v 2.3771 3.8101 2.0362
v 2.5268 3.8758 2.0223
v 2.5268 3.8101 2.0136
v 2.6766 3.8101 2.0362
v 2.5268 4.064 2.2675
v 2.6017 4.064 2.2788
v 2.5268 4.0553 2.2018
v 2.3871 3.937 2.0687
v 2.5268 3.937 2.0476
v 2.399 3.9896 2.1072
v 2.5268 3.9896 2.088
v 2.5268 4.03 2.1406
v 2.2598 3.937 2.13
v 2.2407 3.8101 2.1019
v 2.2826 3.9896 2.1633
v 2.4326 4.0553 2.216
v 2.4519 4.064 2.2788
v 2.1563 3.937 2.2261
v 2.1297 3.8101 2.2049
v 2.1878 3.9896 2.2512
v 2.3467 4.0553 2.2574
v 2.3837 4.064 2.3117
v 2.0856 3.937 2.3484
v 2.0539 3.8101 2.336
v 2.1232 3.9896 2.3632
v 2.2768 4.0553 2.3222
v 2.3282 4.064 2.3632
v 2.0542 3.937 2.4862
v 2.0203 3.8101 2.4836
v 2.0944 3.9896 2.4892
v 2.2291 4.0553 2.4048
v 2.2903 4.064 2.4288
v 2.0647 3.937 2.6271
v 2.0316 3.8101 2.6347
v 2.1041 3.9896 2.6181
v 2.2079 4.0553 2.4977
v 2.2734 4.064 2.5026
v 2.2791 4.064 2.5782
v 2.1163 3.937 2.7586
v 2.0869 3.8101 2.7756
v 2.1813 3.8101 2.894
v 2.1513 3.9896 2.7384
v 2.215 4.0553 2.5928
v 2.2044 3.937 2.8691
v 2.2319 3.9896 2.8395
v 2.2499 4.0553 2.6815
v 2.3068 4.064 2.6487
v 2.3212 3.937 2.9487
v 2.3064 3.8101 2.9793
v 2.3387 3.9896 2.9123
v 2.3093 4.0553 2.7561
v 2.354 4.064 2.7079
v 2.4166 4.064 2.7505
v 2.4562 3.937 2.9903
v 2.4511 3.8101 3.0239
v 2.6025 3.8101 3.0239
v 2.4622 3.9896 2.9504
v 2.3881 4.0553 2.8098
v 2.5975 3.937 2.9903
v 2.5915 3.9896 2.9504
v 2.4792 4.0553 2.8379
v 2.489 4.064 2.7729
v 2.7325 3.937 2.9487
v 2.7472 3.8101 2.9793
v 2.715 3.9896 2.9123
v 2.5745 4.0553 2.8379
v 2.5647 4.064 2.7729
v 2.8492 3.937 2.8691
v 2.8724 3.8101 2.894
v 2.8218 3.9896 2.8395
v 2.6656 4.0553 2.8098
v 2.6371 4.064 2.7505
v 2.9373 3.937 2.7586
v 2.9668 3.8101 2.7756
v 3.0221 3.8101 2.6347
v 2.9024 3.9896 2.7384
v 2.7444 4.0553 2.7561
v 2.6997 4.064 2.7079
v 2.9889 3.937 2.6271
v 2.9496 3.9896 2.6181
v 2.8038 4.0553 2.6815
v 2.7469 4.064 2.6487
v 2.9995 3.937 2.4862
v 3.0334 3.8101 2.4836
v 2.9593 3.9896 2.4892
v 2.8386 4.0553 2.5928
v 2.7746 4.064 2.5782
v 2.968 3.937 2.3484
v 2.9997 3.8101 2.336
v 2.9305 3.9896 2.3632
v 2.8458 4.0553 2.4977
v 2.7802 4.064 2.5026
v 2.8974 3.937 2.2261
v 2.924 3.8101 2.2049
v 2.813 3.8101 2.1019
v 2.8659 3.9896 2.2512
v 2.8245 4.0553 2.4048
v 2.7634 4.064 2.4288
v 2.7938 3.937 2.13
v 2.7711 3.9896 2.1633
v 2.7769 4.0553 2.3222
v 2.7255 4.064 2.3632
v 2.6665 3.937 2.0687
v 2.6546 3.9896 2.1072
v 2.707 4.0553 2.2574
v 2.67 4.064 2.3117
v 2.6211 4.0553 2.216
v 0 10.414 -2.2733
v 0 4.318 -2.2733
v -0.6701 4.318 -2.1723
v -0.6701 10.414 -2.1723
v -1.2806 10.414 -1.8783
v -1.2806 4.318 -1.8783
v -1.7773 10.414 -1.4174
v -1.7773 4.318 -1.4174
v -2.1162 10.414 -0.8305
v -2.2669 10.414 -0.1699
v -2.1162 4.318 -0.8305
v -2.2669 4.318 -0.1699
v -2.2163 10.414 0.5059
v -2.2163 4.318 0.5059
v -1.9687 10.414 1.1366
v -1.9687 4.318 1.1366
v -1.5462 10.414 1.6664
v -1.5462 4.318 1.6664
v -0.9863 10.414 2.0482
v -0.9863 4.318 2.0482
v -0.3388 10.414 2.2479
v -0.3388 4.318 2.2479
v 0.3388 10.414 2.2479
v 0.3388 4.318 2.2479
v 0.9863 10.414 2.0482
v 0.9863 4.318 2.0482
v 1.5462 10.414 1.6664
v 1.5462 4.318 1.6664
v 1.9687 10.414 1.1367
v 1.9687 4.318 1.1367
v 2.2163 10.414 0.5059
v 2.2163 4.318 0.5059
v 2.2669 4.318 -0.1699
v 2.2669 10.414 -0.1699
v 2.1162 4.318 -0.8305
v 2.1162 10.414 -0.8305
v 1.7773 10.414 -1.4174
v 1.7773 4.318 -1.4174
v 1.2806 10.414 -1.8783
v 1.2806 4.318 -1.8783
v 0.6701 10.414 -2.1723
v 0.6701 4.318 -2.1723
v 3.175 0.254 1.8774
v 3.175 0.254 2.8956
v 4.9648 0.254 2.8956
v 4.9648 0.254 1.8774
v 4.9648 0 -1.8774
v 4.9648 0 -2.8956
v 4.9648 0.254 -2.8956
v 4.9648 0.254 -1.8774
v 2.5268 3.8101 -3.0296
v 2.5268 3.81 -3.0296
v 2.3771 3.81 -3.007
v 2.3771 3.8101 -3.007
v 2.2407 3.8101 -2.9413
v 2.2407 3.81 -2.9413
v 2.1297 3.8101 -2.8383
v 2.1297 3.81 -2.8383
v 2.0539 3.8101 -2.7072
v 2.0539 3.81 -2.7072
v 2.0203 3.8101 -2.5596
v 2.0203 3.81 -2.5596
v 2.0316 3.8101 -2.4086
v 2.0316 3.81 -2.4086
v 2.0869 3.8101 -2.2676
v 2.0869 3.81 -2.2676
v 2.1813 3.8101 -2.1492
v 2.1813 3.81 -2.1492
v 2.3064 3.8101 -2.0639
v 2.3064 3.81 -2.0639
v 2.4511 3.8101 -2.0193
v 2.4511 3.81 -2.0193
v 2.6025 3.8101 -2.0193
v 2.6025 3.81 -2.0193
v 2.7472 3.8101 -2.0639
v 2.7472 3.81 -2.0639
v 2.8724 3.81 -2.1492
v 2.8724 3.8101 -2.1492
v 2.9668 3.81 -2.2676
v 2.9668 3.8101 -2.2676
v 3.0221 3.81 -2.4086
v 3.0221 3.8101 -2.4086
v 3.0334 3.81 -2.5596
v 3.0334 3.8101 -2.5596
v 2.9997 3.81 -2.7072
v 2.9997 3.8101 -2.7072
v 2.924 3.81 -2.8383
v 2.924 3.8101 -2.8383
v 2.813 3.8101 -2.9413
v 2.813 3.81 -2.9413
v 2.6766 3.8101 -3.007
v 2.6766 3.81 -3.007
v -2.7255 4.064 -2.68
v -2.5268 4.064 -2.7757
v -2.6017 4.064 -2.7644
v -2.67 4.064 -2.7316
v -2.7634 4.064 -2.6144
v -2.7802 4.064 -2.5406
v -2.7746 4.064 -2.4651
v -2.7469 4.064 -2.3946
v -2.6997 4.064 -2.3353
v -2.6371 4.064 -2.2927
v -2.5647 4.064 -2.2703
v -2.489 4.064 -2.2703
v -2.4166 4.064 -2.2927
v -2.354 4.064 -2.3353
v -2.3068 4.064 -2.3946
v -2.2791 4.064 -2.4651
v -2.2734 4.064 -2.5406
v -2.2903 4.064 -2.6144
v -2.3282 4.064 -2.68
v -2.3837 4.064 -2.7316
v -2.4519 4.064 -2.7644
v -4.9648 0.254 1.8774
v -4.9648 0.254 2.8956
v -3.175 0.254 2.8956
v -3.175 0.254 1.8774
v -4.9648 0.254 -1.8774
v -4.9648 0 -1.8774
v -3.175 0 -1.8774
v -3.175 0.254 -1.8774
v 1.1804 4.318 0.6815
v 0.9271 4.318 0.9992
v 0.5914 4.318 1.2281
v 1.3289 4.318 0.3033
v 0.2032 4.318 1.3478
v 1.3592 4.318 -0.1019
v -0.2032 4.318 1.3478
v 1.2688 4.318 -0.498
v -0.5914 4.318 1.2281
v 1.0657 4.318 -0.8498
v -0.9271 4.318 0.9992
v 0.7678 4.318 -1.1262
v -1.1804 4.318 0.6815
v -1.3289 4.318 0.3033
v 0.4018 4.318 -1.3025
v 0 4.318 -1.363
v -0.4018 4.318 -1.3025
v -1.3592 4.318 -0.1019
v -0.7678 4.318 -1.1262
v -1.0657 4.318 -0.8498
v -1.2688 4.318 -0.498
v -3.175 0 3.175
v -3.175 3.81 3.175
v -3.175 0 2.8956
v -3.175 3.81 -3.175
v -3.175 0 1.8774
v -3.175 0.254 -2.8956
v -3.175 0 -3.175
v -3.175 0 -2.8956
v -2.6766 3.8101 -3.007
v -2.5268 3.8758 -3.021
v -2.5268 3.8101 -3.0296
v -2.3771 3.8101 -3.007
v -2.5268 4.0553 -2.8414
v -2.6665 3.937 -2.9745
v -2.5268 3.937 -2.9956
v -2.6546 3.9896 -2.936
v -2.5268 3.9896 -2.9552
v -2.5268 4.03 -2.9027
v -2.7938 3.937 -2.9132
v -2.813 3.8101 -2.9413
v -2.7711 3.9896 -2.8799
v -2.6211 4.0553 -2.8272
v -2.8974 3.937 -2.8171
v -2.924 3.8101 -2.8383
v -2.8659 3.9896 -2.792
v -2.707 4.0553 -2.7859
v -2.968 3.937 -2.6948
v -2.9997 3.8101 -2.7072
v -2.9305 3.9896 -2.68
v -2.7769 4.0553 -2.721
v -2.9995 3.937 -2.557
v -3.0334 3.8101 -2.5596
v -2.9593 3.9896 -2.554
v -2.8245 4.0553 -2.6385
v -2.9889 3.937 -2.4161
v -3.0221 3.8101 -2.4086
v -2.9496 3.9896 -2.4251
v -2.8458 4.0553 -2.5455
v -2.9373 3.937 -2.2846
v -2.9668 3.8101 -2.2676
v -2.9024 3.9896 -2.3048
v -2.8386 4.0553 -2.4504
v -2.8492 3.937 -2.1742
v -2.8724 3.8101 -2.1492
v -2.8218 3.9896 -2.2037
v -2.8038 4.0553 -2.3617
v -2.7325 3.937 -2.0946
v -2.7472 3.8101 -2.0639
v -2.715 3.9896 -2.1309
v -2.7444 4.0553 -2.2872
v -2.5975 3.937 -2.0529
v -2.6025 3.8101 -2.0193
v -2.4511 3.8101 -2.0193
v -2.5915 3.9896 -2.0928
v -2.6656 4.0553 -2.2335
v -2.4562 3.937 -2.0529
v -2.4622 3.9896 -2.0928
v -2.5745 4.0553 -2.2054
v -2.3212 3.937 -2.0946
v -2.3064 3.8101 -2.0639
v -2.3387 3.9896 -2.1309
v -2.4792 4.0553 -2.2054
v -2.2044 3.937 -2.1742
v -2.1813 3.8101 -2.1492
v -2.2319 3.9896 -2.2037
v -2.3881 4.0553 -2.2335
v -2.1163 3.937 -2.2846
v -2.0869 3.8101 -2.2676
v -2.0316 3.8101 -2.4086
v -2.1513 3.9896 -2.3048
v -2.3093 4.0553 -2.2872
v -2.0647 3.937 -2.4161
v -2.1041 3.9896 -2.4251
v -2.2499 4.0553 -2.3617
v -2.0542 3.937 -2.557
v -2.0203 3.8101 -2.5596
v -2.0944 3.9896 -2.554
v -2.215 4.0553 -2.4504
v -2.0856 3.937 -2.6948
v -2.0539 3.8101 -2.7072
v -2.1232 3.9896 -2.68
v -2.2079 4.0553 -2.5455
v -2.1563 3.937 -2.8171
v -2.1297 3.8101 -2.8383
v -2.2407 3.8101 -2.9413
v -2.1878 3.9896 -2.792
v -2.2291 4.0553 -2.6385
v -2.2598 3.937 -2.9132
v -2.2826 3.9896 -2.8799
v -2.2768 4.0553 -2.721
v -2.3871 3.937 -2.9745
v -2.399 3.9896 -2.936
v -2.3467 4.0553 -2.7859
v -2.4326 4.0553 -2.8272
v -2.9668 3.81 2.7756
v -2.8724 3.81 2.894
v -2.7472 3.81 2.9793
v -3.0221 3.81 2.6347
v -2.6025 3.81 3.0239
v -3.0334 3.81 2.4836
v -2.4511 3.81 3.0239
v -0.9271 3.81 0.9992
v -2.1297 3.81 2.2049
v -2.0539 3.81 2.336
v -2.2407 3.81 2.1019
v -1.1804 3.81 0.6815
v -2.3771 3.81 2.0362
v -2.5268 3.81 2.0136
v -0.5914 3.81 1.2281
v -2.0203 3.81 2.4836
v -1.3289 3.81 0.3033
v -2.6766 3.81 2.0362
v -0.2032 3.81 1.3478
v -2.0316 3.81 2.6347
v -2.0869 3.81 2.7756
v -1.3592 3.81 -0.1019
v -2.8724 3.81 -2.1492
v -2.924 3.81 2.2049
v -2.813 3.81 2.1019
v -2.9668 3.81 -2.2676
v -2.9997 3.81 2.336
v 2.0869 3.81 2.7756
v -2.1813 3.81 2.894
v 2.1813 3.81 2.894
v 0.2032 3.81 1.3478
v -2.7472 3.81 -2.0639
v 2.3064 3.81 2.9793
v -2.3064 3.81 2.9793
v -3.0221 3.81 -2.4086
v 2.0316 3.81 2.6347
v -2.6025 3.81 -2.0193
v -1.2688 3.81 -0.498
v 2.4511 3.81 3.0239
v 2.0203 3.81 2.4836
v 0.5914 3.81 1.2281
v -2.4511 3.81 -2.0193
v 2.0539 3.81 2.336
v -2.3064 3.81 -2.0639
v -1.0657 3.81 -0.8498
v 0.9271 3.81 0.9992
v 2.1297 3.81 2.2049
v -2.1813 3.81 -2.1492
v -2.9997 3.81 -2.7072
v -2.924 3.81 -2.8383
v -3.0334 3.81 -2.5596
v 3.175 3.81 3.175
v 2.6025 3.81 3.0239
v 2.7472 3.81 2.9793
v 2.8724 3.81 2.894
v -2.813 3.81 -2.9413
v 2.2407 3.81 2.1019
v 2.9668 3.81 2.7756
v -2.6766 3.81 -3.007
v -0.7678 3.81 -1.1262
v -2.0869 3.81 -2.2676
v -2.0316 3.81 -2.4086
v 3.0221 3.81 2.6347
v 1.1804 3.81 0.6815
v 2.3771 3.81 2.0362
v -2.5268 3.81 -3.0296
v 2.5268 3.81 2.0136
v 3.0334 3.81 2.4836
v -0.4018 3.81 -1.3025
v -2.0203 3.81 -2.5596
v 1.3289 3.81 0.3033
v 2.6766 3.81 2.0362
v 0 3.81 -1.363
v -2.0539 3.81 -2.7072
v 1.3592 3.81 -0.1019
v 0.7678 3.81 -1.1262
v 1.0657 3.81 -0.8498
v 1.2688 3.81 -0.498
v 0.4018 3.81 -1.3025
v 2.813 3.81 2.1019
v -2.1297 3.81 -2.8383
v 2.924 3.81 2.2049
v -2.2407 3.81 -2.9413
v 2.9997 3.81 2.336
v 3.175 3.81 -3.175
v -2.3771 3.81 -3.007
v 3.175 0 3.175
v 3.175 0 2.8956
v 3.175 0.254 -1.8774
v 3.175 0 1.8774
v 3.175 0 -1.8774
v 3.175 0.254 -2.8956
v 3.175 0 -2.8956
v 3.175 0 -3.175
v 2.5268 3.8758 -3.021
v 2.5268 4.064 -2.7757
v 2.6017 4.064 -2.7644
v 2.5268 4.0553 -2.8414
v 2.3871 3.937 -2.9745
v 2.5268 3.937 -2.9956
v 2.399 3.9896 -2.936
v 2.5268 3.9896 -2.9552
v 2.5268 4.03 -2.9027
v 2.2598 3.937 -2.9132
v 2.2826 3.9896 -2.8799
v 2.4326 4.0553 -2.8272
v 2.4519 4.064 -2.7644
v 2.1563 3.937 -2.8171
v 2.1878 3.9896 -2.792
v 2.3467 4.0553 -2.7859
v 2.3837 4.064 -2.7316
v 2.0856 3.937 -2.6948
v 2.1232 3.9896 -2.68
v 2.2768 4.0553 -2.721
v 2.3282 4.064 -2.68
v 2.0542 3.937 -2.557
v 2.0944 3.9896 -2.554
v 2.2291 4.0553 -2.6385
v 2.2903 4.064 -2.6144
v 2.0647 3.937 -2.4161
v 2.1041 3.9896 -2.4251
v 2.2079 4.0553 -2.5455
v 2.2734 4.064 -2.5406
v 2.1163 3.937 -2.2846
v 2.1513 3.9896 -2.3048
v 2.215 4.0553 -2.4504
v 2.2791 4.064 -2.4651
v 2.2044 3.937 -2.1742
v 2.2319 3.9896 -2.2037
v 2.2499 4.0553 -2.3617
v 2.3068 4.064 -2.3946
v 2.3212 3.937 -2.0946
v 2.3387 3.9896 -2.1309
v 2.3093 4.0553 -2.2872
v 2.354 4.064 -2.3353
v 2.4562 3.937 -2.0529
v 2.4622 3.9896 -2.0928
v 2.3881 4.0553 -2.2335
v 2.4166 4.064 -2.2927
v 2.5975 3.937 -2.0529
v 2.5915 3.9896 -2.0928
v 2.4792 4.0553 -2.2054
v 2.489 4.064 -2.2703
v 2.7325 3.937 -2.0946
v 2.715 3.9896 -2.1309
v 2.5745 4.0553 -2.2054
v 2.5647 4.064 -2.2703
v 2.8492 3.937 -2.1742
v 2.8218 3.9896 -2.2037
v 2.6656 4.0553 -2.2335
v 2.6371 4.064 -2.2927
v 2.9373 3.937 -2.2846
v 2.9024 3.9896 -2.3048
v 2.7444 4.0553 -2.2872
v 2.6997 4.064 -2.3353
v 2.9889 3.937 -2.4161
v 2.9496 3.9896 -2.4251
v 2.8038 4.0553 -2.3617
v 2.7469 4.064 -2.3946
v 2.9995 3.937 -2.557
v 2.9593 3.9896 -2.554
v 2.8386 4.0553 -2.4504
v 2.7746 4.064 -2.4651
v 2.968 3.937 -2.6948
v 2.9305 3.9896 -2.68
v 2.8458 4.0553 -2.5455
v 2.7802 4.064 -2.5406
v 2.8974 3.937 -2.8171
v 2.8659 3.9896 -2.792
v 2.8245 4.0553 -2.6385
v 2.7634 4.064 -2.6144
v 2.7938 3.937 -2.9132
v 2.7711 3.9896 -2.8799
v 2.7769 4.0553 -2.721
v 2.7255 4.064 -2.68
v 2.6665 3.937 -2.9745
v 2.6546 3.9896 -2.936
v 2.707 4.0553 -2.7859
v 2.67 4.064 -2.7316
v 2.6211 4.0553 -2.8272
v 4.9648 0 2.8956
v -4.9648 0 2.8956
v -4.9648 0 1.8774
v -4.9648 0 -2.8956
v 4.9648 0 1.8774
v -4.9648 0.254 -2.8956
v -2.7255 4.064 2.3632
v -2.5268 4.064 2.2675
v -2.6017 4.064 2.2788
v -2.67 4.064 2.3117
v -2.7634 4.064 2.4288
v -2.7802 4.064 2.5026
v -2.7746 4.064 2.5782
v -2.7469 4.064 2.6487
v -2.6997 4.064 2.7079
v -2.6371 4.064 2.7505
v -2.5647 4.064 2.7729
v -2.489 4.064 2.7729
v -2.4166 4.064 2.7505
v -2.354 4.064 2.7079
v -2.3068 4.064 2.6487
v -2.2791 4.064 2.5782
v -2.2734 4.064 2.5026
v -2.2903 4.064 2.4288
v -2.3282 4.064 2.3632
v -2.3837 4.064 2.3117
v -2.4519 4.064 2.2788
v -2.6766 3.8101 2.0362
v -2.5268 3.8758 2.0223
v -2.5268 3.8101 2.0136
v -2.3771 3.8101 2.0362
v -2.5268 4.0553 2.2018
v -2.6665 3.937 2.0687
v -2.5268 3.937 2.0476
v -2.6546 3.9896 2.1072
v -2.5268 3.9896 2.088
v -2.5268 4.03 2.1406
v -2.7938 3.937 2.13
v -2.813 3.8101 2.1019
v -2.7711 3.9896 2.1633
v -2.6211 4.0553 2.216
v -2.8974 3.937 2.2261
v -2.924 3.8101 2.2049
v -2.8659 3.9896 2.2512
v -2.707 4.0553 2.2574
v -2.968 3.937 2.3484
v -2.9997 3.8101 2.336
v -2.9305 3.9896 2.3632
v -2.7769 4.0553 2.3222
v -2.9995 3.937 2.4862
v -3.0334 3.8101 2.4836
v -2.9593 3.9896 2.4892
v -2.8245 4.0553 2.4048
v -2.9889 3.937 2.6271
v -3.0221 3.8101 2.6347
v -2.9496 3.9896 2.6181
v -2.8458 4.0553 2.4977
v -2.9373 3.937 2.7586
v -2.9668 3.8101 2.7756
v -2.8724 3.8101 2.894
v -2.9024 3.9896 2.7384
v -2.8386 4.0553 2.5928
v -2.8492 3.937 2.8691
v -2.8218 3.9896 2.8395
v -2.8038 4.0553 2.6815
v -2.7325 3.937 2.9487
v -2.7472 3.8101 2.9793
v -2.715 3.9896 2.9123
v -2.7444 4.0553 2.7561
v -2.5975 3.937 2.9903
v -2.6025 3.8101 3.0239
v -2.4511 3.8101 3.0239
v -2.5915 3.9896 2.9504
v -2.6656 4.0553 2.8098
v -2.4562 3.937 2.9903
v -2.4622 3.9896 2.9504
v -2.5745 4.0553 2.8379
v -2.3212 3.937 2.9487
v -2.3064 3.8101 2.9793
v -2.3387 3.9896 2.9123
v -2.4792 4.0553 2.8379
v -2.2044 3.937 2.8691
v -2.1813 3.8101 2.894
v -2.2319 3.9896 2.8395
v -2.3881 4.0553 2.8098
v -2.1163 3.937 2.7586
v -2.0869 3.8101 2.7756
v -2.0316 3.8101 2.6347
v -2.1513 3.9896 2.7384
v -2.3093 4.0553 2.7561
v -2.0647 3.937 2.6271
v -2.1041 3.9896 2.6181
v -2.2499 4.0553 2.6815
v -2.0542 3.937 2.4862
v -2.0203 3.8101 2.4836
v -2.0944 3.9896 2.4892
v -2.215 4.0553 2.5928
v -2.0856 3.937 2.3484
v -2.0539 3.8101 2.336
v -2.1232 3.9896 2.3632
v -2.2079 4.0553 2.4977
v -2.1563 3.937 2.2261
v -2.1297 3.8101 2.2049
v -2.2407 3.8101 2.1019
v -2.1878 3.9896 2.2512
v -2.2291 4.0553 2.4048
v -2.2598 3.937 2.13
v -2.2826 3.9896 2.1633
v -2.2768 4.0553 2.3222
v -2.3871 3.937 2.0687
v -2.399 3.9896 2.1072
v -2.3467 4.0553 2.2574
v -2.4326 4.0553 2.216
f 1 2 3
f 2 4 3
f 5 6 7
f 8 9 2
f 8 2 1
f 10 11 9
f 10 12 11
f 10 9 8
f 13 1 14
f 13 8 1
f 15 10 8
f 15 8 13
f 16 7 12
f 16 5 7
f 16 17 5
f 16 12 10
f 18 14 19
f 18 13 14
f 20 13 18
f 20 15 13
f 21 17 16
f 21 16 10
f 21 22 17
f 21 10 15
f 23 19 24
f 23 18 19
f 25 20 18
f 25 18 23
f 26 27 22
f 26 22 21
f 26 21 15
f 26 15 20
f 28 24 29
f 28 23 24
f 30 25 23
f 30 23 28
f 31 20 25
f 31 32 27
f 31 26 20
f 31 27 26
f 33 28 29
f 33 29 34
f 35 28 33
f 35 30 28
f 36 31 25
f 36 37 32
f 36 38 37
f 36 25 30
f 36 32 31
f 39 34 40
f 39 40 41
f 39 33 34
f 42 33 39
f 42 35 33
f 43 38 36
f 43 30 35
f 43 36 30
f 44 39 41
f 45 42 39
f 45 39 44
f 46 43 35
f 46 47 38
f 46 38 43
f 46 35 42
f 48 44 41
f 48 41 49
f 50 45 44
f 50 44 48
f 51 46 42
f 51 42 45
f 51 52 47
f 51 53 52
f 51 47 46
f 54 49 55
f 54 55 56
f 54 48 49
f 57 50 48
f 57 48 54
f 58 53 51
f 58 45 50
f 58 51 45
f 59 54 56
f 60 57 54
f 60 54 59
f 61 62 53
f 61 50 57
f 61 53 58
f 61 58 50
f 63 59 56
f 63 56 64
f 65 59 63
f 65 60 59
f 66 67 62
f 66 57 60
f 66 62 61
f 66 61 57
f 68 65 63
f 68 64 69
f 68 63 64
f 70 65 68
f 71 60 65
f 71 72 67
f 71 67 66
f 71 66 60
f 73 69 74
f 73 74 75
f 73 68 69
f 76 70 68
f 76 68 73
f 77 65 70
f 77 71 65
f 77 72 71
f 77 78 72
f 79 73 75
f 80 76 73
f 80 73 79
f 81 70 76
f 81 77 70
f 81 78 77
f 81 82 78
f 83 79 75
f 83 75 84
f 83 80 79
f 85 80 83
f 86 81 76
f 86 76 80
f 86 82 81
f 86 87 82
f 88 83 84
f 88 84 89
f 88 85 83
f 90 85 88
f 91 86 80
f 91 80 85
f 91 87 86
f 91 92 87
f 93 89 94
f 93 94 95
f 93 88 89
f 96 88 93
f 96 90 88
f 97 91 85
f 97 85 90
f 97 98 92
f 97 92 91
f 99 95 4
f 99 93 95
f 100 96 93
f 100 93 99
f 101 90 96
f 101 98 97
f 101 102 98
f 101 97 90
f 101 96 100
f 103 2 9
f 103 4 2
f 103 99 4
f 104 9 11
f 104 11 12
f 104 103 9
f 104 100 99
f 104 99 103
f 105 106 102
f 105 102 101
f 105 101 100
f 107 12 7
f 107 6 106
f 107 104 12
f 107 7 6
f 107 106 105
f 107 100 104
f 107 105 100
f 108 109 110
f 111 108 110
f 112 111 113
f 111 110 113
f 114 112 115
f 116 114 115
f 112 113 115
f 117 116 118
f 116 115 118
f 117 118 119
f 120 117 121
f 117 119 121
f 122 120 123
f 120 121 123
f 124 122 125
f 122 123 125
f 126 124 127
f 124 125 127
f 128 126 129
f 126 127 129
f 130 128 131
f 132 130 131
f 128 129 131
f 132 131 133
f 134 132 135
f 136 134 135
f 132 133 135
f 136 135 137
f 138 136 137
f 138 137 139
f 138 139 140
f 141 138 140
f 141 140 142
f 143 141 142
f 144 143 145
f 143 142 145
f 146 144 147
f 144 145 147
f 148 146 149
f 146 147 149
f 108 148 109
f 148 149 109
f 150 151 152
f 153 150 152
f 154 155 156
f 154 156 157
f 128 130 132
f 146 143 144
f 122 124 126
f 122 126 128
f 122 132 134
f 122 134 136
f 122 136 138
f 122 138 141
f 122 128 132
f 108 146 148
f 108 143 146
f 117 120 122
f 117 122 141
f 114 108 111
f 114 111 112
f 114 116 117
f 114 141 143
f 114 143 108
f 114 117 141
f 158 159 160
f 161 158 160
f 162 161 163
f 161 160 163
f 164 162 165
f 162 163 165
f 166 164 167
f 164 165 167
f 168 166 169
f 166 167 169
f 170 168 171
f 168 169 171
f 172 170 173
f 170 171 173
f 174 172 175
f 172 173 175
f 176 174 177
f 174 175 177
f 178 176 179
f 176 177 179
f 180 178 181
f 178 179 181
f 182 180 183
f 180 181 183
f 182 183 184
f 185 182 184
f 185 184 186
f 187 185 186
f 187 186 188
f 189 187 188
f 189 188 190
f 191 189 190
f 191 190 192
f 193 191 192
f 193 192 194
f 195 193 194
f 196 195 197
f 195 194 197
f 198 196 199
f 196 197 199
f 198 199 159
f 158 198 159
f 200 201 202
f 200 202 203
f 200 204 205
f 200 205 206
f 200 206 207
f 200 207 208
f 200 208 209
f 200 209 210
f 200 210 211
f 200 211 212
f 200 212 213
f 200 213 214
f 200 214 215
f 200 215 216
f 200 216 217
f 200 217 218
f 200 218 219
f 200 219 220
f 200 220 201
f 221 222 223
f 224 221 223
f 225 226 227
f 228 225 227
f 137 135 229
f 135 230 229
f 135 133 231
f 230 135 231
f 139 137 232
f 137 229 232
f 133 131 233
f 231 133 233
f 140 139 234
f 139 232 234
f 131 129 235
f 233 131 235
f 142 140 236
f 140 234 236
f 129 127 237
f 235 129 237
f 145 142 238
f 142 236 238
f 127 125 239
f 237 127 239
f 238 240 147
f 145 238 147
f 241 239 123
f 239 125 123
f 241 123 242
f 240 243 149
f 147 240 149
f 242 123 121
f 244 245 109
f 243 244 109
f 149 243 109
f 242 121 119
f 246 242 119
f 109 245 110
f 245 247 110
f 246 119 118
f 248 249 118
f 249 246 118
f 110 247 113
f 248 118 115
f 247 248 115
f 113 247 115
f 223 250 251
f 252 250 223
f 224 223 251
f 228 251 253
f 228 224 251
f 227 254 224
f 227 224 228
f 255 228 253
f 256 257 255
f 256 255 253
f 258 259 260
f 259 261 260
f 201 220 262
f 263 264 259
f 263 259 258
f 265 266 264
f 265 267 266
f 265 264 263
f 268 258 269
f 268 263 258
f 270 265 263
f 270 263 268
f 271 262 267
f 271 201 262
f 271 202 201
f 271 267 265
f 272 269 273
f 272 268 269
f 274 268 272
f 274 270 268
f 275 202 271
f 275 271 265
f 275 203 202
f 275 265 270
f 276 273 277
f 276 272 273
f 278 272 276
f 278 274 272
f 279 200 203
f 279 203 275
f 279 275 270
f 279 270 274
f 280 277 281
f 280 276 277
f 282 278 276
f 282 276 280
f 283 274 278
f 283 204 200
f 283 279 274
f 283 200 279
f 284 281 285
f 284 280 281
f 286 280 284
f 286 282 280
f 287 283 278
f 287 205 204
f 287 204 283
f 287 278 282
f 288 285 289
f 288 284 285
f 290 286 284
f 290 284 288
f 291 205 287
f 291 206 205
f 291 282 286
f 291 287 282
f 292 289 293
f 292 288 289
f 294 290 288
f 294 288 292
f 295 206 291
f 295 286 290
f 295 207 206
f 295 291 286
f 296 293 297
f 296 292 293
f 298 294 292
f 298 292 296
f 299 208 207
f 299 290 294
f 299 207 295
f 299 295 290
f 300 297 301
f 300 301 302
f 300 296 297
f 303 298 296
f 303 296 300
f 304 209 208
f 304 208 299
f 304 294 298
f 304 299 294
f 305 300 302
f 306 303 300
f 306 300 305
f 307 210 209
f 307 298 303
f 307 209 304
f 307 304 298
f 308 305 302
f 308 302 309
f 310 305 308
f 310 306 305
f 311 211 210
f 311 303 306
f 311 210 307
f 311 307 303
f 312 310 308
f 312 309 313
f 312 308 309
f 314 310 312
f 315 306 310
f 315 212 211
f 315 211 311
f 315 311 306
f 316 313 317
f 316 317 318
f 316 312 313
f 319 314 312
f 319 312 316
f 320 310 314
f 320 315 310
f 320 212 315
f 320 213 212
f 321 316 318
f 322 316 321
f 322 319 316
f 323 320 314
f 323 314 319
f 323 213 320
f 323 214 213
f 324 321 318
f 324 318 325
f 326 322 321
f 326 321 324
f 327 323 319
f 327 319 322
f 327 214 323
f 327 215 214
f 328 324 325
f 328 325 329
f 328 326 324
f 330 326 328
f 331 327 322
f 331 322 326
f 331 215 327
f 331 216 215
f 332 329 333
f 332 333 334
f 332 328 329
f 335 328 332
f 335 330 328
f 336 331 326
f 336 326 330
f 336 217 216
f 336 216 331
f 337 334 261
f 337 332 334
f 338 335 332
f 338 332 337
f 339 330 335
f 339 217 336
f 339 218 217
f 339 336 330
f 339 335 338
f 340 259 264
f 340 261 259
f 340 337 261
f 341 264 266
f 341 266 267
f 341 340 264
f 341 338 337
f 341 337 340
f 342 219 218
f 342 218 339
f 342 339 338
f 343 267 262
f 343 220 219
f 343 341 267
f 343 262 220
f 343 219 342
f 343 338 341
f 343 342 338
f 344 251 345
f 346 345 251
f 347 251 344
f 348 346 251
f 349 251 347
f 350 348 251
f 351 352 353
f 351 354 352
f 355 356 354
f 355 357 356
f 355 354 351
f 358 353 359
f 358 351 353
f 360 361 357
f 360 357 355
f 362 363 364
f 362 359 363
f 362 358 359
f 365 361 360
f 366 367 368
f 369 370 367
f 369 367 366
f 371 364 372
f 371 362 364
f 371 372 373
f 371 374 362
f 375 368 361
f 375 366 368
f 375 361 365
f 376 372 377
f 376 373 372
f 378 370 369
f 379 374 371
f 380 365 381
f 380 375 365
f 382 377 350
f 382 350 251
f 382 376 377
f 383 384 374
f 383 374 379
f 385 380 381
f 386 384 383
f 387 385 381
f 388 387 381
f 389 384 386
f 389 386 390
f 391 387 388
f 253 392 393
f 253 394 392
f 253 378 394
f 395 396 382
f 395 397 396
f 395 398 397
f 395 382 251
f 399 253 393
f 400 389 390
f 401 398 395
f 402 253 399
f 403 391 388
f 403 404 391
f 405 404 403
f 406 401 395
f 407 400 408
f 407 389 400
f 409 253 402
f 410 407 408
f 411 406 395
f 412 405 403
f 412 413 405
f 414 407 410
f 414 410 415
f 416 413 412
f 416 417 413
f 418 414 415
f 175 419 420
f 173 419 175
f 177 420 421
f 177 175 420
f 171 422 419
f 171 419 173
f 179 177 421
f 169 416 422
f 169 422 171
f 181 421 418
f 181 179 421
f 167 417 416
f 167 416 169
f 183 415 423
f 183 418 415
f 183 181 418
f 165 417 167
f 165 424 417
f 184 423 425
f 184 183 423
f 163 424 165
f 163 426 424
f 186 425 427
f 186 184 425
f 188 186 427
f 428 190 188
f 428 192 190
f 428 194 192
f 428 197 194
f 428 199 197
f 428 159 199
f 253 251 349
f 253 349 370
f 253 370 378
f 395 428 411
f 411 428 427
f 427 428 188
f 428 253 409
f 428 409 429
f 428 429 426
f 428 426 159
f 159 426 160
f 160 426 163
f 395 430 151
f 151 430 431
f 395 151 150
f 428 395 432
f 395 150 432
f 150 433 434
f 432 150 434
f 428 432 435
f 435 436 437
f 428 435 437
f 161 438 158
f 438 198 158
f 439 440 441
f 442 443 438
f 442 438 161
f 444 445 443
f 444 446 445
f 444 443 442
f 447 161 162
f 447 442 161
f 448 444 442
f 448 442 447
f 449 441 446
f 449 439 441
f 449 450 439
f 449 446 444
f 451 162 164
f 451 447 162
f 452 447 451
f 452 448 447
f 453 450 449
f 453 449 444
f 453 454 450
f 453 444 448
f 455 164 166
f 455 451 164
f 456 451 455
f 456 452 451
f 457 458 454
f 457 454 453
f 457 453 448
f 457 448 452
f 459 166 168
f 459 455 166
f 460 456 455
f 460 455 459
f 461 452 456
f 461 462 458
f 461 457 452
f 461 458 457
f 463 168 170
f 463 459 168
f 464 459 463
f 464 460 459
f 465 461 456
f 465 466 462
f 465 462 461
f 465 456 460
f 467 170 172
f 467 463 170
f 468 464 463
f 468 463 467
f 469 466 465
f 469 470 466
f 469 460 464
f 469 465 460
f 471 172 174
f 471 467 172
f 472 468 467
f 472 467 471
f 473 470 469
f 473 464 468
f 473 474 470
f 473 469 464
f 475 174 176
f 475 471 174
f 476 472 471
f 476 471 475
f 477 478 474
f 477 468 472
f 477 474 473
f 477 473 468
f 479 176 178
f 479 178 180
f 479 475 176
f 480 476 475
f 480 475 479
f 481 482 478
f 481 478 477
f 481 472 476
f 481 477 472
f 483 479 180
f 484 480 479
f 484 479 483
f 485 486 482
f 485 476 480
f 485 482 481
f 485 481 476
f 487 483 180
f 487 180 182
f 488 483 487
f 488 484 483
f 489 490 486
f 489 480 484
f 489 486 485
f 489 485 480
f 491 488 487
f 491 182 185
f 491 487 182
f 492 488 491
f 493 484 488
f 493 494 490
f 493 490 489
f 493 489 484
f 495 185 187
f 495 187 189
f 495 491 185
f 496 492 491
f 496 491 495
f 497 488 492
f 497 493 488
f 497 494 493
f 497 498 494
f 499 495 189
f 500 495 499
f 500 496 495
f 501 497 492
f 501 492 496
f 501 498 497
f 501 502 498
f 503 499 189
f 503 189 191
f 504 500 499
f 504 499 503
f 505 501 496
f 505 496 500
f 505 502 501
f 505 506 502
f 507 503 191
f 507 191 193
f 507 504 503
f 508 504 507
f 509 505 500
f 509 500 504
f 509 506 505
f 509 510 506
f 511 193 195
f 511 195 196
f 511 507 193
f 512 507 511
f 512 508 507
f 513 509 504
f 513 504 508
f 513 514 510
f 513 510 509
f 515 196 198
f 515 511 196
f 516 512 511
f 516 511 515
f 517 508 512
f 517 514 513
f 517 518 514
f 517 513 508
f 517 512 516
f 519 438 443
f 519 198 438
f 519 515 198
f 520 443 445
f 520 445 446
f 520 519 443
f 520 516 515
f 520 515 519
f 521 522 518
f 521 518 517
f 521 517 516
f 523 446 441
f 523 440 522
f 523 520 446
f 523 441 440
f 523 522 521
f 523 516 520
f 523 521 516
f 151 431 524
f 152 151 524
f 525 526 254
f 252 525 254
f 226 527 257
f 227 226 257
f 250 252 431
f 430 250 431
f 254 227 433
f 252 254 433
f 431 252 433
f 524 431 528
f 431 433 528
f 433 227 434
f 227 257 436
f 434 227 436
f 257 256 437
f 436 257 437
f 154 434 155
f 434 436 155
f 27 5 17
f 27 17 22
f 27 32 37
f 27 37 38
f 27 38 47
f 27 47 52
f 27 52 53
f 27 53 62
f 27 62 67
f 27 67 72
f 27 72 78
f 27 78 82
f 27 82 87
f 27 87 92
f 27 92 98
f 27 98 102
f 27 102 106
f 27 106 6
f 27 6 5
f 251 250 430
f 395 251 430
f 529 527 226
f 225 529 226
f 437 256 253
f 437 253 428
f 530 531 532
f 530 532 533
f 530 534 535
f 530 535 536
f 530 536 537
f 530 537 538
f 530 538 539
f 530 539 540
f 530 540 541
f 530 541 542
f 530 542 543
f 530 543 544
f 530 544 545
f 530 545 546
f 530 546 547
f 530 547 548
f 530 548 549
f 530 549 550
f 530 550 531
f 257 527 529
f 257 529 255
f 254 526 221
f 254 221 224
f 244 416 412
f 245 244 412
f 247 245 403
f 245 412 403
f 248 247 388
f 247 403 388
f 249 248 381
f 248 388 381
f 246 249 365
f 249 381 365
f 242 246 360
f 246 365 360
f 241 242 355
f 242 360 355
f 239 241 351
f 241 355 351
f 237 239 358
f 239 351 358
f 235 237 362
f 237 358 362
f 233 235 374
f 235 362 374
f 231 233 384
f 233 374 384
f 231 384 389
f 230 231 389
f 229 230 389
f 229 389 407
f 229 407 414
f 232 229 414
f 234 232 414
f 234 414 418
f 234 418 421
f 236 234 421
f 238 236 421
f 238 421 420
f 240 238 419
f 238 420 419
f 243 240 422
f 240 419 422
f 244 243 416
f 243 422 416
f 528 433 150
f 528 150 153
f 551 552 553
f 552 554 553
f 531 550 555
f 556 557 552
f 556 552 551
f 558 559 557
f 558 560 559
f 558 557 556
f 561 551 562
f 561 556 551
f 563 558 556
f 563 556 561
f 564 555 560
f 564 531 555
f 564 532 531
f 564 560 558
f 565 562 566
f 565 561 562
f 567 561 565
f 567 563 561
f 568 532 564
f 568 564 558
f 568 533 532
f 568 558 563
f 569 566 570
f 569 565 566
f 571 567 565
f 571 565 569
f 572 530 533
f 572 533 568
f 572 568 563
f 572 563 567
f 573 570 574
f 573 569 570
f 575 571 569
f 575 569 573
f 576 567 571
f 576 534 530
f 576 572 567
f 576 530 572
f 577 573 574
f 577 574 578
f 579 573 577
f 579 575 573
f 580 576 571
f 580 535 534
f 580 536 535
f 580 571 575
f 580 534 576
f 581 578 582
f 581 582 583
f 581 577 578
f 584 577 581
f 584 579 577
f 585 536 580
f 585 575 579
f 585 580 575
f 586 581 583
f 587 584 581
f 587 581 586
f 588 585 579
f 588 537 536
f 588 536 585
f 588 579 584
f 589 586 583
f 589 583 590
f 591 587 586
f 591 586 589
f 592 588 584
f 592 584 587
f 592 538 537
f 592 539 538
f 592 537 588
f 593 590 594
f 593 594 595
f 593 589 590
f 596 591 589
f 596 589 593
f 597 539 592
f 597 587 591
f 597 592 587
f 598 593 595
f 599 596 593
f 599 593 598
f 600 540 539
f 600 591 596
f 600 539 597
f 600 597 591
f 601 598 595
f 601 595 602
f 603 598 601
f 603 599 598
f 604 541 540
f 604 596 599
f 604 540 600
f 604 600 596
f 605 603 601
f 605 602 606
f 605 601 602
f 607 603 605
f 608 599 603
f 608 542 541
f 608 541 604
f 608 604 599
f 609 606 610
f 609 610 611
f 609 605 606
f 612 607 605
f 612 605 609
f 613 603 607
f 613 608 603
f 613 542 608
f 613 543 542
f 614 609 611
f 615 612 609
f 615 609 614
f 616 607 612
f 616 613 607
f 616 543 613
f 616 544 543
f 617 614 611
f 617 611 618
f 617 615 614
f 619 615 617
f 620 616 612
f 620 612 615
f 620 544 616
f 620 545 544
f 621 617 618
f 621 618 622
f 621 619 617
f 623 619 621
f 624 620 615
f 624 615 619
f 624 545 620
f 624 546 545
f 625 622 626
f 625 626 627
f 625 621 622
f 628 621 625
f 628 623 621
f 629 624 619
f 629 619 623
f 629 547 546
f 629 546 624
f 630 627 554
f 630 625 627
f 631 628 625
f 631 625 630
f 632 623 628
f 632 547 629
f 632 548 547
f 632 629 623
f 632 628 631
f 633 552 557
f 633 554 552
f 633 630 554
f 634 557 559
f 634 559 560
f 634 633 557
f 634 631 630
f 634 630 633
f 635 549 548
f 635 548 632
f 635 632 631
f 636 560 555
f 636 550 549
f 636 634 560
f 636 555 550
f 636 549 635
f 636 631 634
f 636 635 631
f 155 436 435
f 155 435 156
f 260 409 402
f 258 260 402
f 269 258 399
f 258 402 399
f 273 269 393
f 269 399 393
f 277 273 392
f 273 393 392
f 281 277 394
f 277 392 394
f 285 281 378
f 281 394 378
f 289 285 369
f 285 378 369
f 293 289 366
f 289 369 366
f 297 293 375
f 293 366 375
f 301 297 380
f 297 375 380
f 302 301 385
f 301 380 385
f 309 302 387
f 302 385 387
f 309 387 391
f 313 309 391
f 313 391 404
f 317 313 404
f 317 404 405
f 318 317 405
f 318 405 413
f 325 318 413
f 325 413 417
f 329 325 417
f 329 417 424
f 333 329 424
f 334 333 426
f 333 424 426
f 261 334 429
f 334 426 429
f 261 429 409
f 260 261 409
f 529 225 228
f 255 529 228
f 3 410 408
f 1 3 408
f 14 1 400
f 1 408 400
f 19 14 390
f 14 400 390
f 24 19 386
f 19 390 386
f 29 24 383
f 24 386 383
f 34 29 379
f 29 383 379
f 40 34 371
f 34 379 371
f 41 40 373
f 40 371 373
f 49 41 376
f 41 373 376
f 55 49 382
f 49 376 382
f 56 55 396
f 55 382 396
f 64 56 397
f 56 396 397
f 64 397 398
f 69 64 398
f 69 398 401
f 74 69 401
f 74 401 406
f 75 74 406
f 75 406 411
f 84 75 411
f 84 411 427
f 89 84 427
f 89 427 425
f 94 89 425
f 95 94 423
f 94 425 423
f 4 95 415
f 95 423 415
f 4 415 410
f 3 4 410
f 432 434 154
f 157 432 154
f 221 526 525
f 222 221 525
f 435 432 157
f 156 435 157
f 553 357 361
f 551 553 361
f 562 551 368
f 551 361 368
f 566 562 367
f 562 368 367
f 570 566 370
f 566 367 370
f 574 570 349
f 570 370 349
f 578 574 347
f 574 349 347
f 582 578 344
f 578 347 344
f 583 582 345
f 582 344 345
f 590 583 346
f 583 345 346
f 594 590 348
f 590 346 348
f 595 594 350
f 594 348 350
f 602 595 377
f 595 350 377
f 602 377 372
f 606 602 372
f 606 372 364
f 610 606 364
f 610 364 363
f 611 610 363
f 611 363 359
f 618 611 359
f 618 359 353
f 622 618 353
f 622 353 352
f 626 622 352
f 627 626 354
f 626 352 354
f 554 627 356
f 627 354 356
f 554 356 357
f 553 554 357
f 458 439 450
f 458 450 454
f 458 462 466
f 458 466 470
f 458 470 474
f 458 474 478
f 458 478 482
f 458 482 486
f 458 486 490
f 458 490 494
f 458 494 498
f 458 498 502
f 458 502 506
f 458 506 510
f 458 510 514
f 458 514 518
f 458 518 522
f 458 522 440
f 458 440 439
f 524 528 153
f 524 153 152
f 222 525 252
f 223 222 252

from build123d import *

# Parameters (mm, degrees)
SKETCH1_W           = 6.35
SKETCH1_H           = 6.35
BOSS_EXTRUDE1_DEPTH = 3.81
SKETCH2_W           = 1.78977558
SKETCH2_H           = 1.018153585
BOSS_EXTRUDE2_DEPTH = 0.254
SKETCH3_R           = 0.508
BOSS_EXTRUDE3_DEPTH = 0.254
FILLET1_R           = 0.254
SKETCH4_R           = 1.363047184
BOSS_EXTRUDE4_DEPTH = 0.508
SKETCH5_R           = 2.2733
BOSS_EXTRUDE5_DEPTH = 6.096


with BuildPart() as part:
    # Sketch1 → Boss-Extrude1 (new body)
    with BuildSketch(Plane(origin=(0, 0, 0), x_dir=(1, 0, 0), z_dir=(0, 1, 0))):
        Rectangle(SKETCH1_W, SKETCH1_H)
    extrude(amount=BOSS_EXTRUDE1_DEPTH)

    # Sketch2 → Boss-Extrude2 (add)
    with BuildSketch(Plane.XZ):
        with Locations((-4.06988779, -2.386523208)):
            Rectangle(SKETCH2_W, SKETCH2_H)
        with Locations((-4.06988779, 2.386523208)):
            Rectangle(SKETCH2_W, SKETCH2_H)
        with Locations((4.06988779, 2.386523208)):
            Rectangle(SKETCH2_W, SKETCH2_H)
        with Locations((4.06988779, -2.386523208)):
            Rectangle(SKETCH2_W, SKETCH2_H)
    extrude(amount=-BOSS_EXTRUDE2_DEPTH)

    # Sketch3 → Boss-Extrude3 (add)
    with BuildSketch(Plane(origin=(0, 3.81, 0), x_dir=(-1, 0, 0), z_dir=(0, 1, 0))):
        with Locations(Location((2.526830598, -2.521609873, 0), (0, 0, 270))):
            Circle(SKETCH3_R)
        with Locations(Location((-2.526830598, -2.521609873, 0), (0, 0, 270))):
            Circle(SKETCH3_R)
        with Locations(Location((-2.526830598, 2.521609873, 0), (0, 0, 270))):
            Circle(SKETCH3_R)
        with Locations(Location((2.526830598, 2.521609873, 0), (0, 0, 270))):
            Circle(SKETCH3_R)
    extrude(amount=BOSS_EXTRUDE3_DEPTH)

    # Fillet1
    fillet1_edges = [part.edges().sort_by_distance(p)[0] for p in [
        (-2.526830598, 4.064, -2.013609873),
        (2.526830598, 4.064, -2.013609873),
        (2.526830598, 4.064, 3.029609873),
        (-2.526830598, 4.064, 3.029609873),
    ]]
    fillet(fillet1_edges, radius=FILLET1_R - 0.0001)  # a hair under: the kernel refuses the full size

    # Sketch4 → Boss-Extrude4 (add)
    with BuildSketch(Plane(origin=(0, 3.81, 0), x_dir=(1, 0, 0), z_dir=(0, 1, 0))):
        with Locations(Location((0, 0, 0), (0, 0, 90))):
            Circle(SKETCH4_R)
    extrude(amount=BOSS_EXTRUDE4_DEPTH)

    # Sketch5 → Boss-Extrude5 (add)
    with BuildSketch(Plane(origin=(0, 4.318, 0), x_dir=(-1, 0, 0), z_dir=(0, 1, 0))):
        with Locations(Location((0, 0, 0), (0, 0, 270))):
            Circle(SKETCH5_R)
    extrude(amount=BOSS_EXTRUDE5_DEPTH)


solid = part.part
